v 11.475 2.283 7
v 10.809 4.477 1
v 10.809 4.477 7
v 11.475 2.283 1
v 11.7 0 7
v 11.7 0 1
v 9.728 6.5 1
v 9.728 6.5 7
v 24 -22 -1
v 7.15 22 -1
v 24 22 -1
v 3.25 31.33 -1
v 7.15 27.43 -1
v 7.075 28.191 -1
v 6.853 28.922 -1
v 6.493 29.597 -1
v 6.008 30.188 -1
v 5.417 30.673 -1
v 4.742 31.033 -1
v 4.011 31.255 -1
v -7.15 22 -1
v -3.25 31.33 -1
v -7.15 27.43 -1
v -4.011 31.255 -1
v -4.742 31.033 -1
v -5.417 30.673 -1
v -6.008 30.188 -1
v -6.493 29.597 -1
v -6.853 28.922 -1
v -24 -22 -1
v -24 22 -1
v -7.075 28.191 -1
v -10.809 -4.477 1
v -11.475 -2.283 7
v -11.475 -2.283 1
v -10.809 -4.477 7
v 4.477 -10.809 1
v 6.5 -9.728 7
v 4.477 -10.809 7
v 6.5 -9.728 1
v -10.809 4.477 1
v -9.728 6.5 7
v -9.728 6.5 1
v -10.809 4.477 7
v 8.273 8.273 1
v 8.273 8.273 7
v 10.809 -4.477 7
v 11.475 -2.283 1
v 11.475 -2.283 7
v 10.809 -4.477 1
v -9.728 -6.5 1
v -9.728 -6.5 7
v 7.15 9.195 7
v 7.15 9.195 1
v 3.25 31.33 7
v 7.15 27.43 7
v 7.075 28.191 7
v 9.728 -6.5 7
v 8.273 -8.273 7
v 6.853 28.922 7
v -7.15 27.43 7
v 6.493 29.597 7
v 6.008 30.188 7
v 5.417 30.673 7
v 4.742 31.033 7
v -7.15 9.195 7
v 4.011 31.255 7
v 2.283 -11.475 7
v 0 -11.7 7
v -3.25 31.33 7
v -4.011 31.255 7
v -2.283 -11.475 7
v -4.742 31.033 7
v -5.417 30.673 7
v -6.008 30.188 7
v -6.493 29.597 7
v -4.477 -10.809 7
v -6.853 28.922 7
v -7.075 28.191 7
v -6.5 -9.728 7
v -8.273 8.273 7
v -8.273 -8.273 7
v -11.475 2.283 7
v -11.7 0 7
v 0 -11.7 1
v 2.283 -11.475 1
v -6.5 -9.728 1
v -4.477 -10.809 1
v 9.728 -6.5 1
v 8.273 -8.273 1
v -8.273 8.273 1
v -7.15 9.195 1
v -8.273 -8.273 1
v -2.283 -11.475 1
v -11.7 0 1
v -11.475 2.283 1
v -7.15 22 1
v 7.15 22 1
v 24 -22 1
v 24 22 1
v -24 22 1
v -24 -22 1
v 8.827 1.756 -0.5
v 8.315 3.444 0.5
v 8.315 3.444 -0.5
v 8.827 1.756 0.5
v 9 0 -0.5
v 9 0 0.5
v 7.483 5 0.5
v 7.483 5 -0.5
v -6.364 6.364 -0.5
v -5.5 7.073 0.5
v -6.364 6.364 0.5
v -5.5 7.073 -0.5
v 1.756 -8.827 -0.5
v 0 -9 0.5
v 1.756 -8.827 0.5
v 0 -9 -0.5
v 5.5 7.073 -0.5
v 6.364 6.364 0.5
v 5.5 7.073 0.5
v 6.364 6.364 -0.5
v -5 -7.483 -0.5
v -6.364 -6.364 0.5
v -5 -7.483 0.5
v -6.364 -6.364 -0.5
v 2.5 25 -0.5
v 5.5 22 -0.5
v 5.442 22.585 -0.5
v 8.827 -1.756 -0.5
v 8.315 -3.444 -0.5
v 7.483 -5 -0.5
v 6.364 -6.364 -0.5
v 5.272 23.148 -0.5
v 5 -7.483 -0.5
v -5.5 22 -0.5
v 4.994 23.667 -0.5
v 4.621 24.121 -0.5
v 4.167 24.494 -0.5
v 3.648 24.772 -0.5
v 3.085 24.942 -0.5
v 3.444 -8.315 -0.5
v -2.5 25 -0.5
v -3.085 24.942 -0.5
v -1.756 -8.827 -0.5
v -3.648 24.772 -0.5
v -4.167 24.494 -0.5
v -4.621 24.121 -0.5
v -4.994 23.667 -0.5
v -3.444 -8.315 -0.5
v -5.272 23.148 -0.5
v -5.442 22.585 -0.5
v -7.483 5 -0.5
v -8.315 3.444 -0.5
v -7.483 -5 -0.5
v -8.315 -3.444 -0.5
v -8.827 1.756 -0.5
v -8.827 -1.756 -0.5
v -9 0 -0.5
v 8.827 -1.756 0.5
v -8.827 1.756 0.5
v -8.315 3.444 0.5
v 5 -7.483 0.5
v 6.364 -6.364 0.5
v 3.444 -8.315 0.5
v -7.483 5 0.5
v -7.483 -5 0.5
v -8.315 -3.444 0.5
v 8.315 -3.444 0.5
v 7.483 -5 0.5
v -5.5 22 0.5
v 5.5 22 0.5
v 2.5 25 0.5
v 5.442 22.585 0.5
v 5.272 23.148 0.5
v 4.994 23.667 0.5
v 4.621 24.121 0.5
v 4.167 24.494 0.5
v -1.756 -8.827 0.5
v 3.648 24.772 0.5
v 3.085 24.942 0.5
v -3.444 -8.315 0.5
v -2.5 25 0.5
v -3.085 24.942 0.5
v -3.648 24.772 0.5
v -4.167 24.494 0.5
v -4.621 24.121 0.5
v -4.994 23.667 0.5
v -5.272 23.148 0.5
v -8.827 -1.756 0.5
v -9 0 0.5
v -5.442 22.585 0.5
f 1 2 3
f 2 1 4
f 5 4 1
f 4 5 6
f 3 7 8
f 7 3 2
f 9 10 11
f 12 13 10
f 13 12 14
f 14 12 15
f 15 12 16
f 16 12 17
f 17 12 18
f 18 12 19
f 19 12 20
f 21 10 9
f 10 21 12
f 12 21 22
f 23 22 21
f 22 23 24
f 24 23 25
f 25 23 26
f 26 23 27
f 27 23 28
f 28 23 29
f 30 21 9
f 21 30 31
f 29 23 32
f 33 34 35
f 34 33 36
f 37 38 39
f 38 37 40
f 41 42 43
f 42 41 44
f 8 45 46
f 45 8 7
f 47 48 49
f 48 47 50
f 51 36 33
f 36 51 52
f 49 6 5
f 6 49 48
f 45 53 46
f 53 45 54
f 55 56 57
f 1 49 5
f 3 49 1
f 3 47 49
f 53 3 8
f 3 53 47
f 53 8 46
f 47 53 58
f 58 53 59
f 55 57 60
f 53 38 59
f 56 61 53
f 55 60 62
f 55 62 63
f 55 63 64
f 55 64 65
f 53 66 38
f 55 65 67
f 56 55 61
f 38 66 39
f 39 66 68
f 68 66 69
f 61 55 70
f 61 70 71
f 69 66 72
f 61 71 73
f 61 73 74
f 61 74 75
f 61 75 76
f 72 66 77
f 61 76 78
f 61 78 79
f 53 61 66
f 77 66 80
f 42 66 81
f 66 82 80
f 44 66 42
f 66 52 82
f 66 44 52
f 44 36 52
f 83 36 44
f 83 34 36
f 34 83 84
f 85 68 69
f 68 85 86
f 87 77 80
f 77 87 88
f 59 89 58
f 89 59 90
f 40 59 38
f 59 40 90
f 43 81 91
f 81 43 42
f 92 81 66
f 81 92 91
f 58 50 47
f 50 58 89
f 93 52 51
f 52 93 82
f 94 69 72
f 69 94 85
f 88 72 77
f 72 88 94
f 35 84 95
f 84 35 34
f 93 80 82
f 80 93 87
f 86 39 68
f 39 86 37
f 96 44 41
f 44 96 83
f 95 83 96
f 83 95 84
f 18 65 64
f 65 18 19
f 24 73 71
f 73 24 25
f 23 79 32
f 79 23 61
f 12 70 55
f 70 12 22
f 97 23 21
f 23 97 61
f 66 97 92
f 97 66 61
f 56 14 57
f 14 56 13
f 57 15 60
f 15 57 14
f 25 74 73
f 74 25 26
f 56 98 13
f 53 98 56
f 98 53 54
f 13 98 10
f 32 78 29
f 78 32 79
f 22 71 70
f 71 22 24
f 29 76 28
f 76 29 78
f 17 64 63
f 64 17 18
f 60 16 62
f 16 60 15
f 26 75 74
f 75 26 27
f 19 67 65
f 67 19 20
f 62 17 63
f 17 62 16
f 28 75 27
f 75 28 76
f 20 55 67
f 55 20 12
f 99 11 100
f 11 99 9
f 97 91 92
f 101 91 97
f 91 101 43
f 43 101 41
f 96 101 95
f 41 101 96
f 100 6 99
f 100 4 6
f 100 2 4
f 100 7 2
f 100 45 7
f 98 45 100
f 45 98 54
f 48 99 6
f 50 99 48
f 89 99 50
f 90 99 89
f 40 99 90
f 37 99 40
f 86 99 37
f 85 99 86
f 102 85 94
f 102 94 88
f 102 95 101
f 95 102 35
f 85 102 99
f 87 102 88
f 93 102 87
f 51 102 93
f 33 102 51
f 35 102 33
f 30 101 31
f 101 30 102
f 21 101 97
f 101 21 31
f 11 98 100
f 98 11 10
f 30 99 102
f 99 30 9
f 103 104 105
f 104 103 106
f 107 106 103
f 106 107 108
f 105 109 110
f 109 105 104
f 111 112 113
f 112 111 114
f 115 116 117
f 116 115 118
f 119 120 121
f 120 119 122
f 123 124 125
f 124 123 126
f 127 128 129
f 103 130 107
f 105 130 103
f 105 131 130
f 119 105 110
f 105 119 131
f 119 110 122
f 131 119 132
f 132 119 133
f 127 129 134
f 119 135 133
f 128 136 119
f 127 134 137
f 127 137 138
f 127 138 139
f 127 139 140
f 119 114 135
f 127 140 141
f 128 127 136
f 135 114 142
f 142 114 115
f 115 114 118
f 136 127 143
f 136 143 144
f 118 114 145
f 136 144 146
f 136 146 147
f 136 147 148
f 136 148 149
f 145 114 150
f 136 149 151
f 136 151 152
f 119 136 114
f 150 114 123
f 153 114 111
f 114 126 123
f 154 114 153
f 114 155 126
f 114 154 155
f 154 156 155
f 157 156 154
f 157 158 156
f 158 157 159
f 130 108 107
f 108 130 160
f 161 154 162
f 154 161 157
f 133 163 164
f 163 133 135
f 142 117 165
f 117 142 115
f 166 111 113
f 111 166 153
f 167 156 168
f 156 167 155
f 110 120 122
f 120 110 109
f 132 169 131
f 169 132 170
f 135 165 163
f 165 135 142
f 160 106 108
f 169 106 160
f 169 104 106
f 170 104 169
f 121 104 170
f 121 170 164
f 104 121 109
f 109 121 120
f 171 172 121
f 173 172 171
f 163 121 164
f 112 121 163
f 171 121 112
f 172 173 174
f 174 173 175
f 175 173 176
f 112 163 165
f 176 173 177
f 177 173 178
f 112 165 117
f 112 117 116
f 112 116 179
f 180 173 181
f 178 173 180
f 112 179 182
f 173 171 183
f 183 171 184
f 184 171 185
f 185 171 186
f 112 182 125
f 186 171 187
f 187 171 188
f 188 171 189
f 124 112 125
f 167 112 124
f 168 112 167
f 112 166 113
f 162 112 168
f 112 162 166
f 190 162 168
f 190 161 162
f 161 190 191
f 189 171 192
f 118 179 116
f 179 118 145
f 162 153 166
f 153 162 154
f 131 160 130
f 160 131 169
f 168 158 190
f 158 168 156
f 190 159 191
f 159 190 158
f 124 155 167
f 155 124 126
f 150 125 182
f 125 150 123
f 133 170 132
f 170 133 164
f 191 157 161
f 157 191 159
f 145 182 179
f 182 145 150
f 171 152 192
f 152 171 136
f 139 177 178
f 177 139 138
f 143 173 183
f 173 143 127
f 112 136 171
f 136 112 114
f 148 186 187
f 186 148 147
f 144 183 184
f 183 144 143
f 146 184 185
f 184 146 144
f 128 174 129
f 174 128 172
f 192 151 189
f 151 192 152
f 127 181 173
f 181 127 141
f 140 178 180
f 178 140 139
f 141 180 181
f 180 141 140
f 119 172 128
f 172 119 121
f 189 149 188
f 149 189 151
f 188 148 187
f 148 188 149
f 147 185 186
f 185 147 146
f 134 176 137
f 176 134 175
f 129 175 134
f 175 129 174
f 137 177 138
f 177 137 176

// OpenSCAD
$fn=32;
plate_x = 18 + 2*15;
plate_y = 34 + 10;
plate_z = 2;
cylinder_h = 8;
 
  
module eurocylinder(h=1, scale=1) {
  x1 = 18*scale;
  r = 3*scale;
  x2 = 11*scale;
  y2 = (34 - 0.5*18 - r)*scale;
  
  
  cylinder(d=x1, h=h, center=true);
  translate([0, 0.5*y2, 0]) {
      hull() {
      cube([x2, y2, h], center=true);
      translate([0.5*x2-r,0.5*y2, 0]) cylinder(r=r, h=h, center=true);
      translate([-(0.5*x2-r),0.5*y2, 0]) cylinder(r=r, h=h, center=true);
      }
  }
}

module screw_countersunk(
        l=20,   //length
        dh = 8.5,   //head dia
        lh = 3.2,   //head length
        ds = 4,  //shaft dia
        rec = 2,
        $fn=20,
        )
{
    union() {
        translate([0, 0, rec]) {
        cylinder(h=lh, r1=dh/2, r2=ds/2);
        cylinder(h=l, d=ds);
        }
        cylinder(h=rec, d=dh);
    }
}

module plate() {
  cube([plate_x, plate_y, plate_z], center=true);
  translate([0,0,0.5*(cylinder_h-plate_z)]) eurocylinder(scale=1.3, h=cylinder_h);
}


difference() {
  plate();
  eurocylinder();
}
